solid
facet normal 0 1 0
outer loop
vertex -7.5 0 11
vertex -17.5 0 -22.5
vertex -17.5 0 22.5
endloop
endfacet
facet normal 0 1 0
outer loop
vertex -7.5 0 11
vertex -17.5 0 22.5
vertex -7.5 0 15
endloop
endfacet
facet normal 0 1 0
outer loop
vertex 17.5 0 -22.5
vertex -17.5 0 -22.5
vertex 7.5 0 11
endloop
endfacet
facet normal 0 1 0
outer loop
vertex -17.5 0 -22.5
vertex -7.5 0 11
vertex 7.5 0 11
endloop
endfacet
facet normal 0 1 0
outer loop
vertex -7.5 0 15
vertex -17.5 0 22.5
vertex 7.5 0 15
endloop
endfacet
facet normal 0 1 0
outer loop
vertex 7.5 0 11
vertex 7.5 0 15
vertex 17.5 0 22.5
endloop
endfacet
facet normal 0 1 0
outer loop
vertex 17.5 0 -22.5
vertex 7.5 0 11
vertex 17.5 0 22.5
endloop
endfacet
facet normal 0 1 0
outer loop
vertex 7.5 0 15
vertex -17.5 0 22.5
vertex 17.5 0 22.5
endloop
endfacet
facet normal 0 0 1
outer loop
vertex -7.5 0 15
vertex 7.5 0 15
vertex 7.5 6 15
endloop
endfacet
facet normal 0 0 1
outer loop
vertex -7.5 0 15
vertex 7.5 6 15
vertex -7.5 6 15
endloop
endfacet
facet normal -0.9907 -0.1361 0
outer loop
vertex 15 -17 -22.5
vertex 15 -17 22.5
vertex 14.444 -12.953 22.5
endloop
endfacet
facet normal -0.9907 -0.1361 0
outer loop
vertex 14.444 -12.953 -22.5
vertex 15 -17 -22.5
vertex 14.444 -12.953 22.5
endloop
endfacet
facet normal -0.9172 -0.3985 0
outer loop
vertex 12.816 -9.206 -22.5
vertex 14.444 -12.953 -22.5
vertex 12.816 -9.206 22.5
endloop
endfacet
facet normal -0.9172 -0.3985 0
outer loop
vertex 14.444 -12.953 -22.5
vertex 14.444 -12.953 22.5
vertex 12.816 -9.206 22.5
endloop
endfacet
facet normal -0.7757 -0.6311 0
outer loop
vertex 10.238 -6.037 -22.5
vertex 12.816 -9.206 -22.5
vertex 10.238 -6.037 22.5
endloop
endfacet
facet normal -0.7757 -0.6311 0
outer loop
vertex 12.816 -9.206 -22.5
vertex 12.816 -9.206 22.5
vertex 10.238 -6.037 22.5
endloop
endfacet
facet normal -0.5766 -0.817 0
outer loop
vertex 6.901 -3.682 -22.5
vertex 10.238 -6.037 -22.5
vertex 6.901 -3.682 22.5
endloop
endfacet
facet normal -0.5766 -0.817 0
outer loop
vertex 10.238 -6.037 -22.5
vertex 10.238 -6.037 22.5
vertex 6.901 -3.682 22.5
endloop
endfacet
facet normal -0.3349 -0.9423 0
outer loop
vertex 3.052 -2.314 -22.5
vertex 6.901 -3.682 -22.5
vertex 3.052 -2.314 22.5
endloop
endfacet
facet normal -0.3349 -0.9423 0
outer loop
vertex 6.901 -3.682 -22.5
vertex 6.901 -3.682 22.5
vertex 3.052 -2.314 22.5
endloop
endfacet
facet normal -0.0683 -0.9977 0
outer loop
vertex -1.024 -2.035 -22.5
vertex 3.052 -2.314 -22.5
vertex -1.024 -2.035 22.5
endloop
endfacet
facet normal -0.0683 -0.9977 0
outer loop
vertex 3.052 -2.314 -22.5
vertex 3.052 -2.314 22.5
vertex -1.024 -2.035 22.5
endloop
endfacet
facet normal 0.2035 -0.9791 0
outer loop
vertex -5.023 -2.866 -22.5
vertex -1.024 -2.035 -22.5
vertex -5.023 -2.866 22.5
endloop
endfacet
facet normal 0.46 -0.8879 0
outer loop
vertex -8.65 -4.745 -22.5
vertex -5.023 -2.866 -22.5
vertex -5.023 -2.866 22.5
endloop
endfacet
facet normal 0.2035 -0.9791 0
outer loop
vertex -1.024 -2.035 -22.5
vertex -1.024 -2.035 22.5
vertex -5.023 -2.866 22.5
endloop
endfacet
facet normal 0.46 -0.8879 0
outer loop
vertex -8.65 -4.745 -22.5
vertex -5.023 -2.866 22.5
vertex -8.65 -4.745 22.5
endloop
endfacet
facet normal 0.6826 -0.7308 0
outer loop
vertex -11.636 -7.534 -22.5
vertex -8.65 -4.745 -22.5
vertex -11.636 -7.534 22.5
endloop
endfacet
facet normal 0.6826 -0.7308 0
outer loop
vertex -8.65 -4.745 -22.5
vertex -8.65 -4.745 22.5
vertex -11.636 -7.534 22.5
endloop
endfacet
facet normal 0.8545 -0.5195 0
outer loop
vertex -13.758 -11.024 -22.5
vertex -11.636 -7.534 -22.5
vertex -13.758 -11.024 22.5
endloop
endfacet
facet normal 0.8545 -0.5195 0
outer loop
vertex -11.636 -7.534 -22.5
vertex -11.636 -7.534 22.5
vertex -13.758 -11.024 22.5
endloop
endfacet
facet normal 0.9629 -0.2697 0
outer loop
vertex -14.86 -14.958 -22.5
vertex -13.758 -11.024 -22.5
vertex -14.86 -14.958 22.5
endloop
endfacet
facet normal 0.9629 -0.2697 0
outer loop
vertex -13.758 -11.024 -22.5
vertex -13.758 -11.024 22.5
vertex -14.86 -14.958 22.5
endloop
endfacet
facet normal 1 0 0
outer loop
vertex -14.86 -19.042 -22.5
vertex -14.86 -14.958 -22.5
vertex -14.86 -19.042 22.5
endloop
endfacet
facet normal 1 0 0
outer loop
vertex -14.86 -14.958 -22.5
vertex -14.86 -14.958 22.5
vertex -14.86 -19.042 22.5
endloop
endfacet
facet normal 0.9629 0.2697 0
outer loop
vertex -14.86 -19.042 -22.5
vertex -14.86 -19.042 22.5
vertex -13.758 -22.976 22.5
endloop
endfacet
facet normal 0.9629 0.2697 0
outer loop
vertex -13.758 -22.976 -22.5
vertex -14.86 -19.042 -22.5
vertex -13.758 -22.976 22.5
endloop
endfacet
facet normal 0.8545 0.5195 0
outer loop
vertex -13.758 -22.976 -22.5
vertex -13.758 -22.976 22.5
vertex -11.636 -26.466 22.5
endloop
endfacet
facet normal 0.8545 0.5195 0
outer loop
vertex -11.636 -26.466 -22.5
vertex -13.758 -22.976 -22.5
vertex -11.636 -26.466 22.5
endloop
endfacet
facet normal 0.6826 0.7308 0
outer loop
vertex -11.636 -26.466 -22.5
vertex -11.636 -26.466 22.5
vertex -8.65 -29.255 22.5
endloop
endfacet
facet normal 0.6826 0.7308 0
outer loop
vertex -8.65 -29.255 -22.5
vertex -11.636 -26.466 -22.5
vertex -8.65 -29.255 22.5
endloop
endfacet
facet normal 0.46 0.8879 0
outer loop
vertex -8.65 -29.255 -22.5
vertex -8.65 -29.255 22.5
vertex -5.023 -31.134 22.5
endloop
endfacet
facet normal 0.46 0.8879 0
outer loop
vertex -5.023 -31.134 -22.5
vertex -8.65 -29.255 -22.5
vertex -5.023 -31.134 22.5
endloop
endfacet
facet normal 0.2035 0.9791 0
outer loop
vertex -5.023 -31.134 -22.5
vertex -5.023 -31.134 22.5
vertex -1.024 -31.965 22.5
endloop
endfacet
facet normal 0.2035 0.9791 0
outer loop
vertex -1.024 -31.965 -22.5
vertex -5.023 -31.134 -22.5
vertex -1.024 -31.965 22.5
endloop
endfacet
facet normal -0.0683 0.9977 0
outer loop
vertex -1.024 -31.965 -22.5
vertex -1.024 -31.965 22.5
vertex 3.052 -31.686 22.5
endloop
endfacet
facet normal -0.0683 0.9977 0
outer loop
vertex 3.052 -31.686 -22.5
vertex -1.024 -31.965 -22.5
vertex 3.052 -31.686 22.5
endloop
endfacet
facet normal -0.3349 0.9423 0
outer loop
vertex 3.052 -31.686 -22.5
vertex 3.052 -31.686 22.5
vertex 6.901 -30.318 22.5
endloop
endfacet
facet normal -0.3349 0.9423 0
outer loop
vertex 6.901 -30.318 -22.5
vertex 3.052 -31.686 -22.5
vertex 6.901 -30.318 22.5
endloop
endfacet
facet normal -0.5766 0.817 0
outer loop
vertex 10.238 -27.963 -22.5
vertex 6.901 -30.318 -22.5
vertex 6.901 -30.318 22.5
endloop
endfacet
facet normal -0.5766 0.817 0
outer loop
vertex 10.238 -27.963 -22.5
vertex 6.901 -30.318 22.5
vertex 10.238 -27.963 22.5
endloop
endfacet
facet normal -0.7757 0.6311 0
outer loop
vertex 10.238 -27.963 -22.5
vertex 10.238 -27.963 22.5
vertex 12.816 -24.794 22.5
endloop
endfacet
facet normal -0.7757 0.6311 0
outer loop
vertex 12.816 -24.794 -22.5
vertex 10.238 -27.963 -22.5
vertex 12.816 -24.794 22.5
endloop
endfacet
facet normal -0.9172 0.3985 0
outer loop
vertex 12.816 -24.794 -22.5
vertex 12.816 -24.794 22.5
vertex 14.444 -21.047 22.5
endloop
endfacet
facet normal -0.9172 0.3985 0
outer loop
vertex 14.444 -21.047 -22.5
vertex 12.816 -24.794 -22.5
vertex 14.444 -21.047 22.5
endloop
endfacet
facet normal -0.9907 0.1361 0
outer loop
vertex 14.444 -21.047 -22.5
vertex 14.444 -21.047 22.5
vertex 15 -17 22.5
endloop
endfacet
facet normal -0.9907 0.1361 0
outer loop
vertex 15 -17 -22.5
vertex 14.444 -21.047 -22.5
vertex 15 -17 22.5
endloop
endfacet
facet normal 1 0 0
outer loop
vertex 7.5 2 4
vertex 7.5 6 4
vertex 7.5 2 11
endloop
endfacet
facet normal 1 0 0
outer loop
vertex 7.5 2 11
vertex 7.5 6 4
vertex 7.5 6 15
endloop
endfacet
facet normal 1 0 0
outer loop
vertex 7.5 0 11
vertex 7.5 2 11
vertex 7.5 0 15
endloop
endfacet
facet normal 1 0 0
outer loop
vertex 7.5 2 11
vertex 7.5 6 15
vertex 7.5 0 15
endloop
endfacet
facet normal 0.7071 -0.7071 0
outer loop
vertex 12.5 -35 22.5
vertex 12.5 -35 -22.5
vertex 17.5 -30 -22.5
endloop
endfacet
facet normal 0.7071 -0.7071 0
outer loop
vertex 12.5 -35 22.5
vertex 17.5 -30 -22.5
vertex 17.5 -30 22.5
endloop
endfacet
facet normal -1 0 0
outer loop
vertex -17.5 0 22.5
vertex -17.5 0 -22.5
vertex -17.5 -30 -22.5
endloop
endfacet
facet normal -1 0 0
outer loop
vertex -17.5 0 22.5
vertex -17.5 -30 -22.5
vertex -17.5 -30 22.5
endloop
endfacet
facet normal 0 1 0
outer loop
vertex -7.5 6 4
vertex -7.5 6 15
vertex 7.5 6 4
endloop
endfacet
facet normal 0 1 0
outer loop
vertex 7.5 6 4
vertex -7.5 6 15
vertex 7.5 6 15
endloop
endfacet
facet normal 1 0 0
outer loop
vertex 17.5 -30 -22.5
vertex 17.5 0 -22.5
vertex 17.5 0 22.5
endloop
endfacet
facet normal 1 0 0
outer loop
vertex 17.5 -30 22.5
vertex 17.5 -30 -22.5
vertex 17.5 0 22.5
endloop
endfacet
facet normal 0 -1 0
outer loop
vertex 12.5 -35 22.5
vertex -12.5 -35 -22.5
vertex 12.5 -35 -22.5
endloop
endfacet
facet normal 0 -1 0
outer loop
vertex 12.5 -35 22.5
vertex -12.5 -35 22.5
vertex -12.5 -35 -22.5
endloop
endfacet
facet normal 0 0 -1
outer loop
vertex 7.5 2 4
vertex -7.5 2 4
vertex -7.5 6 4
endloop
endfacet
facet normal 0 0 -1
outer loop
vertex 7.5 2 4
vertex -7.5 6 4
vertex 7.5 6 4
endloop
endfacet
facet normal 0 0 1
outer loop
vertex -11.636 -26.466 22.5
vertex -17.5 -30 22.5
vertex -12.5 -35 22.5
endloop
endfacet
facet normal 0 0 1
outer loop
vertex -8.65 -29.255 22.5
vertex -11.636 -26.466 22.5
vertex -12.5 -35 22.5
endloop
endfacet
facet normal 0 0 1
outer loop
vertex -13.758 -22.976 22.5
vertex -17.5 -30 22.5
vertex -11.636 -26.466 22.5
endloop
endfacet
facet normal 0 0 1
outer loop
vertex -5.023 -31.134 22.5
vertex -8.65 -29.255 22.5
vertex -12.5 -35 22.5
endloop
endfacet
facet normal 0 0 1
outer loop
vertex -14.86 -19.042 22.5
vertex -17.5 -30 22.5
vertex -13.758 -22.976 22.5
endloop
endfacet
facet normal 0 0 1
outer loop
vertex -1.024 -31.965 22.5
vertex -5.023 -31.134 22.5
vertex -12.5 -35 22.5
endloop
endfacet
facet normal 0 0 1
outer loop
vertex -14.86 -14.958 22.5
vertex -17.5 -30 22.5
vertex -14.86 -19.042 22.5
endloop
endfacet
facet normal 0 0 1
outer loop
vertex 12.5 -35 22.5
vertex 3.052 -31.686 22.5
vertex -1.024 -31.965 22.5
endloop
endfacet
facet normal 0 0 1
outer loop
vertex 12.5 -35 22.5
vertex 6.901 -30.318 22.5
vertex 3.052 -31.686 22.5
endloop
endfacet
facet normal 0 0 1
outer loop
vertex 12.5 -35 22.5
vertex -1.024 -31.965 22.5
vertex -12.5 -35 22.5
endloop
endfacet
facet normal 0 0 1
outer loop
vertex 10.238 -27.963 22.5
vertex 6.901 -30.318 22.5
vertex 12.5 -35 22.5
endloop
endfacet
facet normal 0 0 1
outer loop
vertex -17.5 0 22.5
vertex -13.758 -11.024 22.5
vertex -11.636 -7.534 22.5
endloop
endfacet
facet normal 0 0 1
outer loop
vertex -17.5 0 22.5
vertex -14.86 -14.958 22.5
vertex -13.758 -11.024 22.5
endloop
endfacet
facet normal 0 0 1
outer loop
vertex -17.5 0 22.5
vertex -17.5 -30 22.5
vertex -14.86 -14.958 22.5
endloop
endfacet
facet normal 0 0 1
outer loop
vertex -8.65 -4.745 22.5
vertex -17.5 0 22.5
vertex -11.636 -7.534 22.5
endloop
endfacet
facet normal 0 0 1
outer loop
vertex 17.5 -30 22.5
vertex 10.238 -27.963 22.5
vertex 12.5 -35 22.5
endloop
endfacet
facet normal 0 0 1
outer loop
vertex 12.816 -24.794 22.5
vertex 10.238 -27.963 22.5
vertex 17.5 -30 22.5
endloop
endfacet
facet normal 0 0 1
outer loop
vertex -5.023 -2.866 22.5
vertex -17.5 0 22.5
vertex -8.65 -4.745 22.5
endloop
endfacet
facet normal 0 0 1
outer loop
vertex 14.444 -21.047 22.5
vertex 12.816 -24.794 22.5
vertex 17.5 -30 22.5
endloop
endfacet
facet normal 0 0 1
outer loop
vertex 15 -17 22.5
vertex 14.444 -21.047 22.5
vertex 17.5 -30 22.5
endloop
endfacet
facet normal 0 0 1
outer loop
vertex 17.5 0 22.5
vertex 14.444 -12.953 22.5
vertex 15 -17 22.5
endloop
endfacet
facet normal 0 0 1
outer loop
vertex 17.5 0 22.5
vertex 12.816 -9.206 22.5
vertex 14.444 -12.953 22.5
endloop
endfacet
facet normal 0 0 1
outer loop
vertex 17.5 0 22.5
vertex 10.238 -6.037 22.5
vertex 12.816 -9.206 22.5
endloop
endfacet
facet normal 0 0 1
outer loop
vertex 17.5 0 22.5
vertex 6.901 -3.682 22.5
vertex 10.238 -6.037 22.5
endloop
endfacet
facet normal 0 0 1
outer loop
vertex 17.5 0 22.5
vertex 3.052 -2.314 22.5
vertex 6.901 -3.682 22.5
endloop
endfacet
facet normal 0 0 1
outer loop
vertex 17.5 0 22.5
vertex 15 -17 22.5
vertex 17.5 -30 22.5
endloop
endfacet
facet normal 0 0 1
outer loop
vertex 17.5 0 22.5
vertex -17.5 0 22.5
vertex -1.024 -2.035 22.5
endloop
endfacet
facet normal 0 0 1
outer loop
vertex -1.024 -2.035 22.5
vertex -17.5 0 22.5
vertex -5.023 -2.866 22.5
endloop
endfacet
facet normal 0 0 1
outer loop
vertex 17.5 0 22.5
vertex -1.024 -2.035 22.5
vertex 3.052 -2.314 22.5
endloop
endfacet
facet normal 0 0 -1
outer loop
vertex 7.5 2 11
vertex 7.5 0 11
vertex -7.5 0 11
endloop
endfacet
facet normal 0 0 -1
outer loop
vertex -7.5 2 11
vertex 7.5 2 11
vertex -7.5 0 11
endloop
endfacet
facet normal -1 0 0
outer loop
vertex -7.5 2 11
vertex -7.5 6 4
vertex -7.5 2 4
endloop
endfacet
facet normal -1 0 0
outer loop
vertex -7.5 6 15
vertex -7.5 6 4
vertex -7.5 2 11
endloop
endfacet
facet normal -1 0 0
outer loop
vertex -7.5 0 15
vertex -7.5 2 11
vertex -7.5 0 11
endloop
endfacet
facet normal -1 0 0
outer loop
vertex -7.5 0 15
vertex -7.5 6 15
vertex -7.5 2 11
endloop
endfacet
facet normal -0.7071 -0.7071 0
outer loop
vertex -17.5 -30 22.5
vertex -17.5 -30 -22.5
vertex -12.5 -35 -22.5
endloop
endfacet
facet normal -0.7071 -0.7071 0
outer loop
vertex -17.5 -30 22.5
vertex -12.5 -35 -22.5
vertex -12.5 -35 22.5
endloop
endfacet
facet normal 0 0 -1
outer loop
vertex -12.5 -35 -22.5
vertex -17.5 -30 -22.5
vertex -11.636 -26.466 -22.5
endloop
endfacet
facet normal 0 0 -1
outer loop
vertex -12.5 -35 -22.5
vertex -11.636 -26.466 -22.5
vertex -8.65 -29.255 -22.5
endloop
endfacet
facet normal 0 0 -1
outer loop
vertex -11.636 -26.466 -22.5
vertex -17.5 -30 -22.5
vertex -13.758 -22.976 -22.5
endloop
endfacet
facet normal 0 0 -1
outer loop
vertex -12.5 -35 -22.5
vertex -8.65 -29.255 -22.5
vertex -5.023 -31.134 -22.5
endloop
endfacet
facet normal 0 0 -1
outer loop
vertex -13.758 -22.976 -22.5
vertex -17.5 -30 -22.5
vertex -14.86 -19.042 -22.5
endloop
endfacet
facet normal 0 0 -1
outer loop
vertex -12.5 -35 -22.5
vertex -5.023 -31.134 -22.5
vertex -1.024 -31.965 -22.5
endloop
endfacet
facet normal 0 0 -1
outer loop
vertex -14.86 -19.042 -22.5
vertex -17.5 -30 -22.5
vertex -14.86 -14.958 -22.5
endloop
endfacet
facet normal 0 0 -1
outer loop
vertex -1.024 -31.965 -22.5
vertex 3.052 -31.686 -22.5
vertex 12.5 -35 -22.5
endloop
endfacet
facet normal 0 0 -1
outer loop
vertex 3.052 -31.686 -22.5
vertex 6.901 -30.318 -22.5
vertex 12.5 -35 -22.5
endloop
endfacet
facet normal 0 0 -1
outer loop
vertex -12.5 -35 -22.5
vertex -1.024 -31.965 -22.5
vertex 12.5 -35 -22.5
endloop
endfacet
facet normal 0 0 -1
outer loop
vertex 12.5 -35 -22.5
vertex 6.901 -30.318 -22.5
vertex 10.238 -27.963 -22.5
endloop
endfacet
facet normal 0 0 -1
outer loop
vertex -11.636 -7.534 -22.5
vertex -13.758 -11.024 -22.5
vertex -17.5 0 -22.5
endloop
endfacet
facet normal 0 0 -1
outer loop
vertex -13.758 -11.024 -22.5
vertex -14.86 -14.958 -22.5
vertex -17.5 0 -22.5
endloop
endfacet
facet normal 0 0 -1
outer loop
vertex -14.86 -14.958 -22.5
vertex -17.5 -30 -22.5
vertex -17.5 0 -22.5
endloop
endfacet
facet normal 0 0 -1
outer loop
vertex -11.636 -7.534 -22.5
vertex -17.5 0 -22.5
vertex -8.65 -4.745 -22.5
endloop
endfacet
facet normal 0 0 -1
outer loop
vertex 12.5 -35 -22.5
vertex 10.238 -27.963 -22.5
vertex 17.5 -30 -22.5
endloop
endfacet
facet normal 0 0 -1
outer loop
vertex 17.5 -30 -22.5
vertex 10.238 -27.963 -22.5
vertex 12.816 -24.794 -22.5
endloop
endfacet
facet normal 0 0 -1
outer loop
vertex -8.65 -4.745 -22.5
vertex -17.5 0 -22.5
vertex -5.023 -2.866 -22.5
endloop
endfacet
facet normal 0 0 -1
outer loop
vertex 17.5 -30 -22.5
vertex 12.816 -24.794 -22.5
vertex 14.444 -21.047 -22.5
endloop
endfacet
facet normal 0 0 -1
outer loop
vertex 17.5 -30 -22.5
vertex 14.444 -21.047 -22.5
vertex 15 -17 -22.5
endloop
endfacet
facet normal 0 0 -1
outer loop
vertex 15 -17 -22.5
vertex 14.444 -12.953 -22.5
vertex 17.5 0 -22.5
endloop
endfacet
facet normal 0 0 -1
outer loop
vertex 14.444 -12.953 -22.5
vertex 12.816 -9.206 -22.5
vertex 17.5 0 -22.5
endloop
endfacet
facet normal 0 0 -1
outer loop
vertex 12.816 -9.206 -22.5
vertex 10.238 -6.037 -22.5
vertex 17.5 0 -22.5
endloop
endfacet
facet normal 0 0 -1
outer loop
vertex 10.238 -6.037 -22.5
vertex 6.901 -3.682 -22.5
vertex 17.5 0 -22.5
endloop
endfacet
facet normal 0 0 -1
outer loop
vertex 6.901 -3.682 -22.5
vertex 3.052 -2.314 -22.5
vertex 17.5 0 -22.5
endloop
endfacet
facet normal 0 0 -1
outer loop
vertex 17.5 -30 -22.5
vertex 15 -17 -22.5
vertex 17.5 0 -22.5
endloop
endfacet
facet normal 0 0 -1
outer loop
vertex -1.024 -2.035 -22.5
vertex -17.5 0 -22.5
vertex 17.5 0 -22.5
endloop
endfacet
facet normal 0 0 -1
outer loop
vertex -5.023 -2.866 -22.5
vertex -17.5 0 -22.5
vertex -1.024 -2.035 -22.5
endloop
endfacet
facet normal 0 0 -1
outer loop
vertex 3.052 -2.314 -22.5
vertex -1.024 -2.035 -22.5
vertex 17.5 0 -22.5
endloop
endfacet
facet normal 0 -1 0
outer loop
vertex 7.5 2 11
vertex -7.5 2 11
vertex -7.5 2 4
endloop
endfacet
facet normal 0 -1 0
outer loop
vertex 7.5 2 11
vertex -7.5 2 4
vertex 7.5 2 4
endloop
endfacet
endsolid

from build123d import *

# Parameters (mm, degrees)
F0_W     = 35
F0_H     = 45
F1_DEPTH = 35
F2_W     = 15
F2_H     = 4
F3_DEPTH = 6
F4_W     = 15
F4_H     = 4
F5_DEPTH = 7
F6_SIZE  = 5
F7_R     = 15
F8_DEPTH = 45.001


with BuildPart() as f1:
    # F0 (on Front) → F1 (new body)
    with BuildSketch(Plane.XZ):
        Rectangle(F0_W, F0_H)
    extrude(amount=F1_DEPTH)

    # F2 (on face) → F3 (join)
    with BuildSketch(Plane(origin=(0, 0, 0), x_dir=(-1, 0, 0), z_dir=(0, 1, 0))):
        with Locations((0, 13)):
            Rectangle(F2_W, F2_H)
    extrude(amount=F3_DEPTH)

    # F4 (on face) → F5 (join)
    with BuildSketch(Plane(origin=(0, 0, 11), x_dir=(1, 0, 0), z_dir=(0, 0, -1))):
        with Locations((0, -4)):
            Rectangle(F4_W, F4_H)
    extrude(amount=F5_DEPTH)

    # F6
    f6_edges = [f1.edges().sort_by_distance(p)[0] for p in [
        (-17.5, -35, 0),
        (17.5, -35, 0),
    ]]
    chamfer(f6_edges, length=F6_SIZE)

    # F7 (on face) → F8 (cut, through all)
    with BuildSketch(Plane.XY.offset(22.5)):
        with Locations((0, -17)):
            Circle(F7_R)
    extrude(amount=-F8_DEPTH, mode=Mode.SUBTRACT)


solid = f1.part
